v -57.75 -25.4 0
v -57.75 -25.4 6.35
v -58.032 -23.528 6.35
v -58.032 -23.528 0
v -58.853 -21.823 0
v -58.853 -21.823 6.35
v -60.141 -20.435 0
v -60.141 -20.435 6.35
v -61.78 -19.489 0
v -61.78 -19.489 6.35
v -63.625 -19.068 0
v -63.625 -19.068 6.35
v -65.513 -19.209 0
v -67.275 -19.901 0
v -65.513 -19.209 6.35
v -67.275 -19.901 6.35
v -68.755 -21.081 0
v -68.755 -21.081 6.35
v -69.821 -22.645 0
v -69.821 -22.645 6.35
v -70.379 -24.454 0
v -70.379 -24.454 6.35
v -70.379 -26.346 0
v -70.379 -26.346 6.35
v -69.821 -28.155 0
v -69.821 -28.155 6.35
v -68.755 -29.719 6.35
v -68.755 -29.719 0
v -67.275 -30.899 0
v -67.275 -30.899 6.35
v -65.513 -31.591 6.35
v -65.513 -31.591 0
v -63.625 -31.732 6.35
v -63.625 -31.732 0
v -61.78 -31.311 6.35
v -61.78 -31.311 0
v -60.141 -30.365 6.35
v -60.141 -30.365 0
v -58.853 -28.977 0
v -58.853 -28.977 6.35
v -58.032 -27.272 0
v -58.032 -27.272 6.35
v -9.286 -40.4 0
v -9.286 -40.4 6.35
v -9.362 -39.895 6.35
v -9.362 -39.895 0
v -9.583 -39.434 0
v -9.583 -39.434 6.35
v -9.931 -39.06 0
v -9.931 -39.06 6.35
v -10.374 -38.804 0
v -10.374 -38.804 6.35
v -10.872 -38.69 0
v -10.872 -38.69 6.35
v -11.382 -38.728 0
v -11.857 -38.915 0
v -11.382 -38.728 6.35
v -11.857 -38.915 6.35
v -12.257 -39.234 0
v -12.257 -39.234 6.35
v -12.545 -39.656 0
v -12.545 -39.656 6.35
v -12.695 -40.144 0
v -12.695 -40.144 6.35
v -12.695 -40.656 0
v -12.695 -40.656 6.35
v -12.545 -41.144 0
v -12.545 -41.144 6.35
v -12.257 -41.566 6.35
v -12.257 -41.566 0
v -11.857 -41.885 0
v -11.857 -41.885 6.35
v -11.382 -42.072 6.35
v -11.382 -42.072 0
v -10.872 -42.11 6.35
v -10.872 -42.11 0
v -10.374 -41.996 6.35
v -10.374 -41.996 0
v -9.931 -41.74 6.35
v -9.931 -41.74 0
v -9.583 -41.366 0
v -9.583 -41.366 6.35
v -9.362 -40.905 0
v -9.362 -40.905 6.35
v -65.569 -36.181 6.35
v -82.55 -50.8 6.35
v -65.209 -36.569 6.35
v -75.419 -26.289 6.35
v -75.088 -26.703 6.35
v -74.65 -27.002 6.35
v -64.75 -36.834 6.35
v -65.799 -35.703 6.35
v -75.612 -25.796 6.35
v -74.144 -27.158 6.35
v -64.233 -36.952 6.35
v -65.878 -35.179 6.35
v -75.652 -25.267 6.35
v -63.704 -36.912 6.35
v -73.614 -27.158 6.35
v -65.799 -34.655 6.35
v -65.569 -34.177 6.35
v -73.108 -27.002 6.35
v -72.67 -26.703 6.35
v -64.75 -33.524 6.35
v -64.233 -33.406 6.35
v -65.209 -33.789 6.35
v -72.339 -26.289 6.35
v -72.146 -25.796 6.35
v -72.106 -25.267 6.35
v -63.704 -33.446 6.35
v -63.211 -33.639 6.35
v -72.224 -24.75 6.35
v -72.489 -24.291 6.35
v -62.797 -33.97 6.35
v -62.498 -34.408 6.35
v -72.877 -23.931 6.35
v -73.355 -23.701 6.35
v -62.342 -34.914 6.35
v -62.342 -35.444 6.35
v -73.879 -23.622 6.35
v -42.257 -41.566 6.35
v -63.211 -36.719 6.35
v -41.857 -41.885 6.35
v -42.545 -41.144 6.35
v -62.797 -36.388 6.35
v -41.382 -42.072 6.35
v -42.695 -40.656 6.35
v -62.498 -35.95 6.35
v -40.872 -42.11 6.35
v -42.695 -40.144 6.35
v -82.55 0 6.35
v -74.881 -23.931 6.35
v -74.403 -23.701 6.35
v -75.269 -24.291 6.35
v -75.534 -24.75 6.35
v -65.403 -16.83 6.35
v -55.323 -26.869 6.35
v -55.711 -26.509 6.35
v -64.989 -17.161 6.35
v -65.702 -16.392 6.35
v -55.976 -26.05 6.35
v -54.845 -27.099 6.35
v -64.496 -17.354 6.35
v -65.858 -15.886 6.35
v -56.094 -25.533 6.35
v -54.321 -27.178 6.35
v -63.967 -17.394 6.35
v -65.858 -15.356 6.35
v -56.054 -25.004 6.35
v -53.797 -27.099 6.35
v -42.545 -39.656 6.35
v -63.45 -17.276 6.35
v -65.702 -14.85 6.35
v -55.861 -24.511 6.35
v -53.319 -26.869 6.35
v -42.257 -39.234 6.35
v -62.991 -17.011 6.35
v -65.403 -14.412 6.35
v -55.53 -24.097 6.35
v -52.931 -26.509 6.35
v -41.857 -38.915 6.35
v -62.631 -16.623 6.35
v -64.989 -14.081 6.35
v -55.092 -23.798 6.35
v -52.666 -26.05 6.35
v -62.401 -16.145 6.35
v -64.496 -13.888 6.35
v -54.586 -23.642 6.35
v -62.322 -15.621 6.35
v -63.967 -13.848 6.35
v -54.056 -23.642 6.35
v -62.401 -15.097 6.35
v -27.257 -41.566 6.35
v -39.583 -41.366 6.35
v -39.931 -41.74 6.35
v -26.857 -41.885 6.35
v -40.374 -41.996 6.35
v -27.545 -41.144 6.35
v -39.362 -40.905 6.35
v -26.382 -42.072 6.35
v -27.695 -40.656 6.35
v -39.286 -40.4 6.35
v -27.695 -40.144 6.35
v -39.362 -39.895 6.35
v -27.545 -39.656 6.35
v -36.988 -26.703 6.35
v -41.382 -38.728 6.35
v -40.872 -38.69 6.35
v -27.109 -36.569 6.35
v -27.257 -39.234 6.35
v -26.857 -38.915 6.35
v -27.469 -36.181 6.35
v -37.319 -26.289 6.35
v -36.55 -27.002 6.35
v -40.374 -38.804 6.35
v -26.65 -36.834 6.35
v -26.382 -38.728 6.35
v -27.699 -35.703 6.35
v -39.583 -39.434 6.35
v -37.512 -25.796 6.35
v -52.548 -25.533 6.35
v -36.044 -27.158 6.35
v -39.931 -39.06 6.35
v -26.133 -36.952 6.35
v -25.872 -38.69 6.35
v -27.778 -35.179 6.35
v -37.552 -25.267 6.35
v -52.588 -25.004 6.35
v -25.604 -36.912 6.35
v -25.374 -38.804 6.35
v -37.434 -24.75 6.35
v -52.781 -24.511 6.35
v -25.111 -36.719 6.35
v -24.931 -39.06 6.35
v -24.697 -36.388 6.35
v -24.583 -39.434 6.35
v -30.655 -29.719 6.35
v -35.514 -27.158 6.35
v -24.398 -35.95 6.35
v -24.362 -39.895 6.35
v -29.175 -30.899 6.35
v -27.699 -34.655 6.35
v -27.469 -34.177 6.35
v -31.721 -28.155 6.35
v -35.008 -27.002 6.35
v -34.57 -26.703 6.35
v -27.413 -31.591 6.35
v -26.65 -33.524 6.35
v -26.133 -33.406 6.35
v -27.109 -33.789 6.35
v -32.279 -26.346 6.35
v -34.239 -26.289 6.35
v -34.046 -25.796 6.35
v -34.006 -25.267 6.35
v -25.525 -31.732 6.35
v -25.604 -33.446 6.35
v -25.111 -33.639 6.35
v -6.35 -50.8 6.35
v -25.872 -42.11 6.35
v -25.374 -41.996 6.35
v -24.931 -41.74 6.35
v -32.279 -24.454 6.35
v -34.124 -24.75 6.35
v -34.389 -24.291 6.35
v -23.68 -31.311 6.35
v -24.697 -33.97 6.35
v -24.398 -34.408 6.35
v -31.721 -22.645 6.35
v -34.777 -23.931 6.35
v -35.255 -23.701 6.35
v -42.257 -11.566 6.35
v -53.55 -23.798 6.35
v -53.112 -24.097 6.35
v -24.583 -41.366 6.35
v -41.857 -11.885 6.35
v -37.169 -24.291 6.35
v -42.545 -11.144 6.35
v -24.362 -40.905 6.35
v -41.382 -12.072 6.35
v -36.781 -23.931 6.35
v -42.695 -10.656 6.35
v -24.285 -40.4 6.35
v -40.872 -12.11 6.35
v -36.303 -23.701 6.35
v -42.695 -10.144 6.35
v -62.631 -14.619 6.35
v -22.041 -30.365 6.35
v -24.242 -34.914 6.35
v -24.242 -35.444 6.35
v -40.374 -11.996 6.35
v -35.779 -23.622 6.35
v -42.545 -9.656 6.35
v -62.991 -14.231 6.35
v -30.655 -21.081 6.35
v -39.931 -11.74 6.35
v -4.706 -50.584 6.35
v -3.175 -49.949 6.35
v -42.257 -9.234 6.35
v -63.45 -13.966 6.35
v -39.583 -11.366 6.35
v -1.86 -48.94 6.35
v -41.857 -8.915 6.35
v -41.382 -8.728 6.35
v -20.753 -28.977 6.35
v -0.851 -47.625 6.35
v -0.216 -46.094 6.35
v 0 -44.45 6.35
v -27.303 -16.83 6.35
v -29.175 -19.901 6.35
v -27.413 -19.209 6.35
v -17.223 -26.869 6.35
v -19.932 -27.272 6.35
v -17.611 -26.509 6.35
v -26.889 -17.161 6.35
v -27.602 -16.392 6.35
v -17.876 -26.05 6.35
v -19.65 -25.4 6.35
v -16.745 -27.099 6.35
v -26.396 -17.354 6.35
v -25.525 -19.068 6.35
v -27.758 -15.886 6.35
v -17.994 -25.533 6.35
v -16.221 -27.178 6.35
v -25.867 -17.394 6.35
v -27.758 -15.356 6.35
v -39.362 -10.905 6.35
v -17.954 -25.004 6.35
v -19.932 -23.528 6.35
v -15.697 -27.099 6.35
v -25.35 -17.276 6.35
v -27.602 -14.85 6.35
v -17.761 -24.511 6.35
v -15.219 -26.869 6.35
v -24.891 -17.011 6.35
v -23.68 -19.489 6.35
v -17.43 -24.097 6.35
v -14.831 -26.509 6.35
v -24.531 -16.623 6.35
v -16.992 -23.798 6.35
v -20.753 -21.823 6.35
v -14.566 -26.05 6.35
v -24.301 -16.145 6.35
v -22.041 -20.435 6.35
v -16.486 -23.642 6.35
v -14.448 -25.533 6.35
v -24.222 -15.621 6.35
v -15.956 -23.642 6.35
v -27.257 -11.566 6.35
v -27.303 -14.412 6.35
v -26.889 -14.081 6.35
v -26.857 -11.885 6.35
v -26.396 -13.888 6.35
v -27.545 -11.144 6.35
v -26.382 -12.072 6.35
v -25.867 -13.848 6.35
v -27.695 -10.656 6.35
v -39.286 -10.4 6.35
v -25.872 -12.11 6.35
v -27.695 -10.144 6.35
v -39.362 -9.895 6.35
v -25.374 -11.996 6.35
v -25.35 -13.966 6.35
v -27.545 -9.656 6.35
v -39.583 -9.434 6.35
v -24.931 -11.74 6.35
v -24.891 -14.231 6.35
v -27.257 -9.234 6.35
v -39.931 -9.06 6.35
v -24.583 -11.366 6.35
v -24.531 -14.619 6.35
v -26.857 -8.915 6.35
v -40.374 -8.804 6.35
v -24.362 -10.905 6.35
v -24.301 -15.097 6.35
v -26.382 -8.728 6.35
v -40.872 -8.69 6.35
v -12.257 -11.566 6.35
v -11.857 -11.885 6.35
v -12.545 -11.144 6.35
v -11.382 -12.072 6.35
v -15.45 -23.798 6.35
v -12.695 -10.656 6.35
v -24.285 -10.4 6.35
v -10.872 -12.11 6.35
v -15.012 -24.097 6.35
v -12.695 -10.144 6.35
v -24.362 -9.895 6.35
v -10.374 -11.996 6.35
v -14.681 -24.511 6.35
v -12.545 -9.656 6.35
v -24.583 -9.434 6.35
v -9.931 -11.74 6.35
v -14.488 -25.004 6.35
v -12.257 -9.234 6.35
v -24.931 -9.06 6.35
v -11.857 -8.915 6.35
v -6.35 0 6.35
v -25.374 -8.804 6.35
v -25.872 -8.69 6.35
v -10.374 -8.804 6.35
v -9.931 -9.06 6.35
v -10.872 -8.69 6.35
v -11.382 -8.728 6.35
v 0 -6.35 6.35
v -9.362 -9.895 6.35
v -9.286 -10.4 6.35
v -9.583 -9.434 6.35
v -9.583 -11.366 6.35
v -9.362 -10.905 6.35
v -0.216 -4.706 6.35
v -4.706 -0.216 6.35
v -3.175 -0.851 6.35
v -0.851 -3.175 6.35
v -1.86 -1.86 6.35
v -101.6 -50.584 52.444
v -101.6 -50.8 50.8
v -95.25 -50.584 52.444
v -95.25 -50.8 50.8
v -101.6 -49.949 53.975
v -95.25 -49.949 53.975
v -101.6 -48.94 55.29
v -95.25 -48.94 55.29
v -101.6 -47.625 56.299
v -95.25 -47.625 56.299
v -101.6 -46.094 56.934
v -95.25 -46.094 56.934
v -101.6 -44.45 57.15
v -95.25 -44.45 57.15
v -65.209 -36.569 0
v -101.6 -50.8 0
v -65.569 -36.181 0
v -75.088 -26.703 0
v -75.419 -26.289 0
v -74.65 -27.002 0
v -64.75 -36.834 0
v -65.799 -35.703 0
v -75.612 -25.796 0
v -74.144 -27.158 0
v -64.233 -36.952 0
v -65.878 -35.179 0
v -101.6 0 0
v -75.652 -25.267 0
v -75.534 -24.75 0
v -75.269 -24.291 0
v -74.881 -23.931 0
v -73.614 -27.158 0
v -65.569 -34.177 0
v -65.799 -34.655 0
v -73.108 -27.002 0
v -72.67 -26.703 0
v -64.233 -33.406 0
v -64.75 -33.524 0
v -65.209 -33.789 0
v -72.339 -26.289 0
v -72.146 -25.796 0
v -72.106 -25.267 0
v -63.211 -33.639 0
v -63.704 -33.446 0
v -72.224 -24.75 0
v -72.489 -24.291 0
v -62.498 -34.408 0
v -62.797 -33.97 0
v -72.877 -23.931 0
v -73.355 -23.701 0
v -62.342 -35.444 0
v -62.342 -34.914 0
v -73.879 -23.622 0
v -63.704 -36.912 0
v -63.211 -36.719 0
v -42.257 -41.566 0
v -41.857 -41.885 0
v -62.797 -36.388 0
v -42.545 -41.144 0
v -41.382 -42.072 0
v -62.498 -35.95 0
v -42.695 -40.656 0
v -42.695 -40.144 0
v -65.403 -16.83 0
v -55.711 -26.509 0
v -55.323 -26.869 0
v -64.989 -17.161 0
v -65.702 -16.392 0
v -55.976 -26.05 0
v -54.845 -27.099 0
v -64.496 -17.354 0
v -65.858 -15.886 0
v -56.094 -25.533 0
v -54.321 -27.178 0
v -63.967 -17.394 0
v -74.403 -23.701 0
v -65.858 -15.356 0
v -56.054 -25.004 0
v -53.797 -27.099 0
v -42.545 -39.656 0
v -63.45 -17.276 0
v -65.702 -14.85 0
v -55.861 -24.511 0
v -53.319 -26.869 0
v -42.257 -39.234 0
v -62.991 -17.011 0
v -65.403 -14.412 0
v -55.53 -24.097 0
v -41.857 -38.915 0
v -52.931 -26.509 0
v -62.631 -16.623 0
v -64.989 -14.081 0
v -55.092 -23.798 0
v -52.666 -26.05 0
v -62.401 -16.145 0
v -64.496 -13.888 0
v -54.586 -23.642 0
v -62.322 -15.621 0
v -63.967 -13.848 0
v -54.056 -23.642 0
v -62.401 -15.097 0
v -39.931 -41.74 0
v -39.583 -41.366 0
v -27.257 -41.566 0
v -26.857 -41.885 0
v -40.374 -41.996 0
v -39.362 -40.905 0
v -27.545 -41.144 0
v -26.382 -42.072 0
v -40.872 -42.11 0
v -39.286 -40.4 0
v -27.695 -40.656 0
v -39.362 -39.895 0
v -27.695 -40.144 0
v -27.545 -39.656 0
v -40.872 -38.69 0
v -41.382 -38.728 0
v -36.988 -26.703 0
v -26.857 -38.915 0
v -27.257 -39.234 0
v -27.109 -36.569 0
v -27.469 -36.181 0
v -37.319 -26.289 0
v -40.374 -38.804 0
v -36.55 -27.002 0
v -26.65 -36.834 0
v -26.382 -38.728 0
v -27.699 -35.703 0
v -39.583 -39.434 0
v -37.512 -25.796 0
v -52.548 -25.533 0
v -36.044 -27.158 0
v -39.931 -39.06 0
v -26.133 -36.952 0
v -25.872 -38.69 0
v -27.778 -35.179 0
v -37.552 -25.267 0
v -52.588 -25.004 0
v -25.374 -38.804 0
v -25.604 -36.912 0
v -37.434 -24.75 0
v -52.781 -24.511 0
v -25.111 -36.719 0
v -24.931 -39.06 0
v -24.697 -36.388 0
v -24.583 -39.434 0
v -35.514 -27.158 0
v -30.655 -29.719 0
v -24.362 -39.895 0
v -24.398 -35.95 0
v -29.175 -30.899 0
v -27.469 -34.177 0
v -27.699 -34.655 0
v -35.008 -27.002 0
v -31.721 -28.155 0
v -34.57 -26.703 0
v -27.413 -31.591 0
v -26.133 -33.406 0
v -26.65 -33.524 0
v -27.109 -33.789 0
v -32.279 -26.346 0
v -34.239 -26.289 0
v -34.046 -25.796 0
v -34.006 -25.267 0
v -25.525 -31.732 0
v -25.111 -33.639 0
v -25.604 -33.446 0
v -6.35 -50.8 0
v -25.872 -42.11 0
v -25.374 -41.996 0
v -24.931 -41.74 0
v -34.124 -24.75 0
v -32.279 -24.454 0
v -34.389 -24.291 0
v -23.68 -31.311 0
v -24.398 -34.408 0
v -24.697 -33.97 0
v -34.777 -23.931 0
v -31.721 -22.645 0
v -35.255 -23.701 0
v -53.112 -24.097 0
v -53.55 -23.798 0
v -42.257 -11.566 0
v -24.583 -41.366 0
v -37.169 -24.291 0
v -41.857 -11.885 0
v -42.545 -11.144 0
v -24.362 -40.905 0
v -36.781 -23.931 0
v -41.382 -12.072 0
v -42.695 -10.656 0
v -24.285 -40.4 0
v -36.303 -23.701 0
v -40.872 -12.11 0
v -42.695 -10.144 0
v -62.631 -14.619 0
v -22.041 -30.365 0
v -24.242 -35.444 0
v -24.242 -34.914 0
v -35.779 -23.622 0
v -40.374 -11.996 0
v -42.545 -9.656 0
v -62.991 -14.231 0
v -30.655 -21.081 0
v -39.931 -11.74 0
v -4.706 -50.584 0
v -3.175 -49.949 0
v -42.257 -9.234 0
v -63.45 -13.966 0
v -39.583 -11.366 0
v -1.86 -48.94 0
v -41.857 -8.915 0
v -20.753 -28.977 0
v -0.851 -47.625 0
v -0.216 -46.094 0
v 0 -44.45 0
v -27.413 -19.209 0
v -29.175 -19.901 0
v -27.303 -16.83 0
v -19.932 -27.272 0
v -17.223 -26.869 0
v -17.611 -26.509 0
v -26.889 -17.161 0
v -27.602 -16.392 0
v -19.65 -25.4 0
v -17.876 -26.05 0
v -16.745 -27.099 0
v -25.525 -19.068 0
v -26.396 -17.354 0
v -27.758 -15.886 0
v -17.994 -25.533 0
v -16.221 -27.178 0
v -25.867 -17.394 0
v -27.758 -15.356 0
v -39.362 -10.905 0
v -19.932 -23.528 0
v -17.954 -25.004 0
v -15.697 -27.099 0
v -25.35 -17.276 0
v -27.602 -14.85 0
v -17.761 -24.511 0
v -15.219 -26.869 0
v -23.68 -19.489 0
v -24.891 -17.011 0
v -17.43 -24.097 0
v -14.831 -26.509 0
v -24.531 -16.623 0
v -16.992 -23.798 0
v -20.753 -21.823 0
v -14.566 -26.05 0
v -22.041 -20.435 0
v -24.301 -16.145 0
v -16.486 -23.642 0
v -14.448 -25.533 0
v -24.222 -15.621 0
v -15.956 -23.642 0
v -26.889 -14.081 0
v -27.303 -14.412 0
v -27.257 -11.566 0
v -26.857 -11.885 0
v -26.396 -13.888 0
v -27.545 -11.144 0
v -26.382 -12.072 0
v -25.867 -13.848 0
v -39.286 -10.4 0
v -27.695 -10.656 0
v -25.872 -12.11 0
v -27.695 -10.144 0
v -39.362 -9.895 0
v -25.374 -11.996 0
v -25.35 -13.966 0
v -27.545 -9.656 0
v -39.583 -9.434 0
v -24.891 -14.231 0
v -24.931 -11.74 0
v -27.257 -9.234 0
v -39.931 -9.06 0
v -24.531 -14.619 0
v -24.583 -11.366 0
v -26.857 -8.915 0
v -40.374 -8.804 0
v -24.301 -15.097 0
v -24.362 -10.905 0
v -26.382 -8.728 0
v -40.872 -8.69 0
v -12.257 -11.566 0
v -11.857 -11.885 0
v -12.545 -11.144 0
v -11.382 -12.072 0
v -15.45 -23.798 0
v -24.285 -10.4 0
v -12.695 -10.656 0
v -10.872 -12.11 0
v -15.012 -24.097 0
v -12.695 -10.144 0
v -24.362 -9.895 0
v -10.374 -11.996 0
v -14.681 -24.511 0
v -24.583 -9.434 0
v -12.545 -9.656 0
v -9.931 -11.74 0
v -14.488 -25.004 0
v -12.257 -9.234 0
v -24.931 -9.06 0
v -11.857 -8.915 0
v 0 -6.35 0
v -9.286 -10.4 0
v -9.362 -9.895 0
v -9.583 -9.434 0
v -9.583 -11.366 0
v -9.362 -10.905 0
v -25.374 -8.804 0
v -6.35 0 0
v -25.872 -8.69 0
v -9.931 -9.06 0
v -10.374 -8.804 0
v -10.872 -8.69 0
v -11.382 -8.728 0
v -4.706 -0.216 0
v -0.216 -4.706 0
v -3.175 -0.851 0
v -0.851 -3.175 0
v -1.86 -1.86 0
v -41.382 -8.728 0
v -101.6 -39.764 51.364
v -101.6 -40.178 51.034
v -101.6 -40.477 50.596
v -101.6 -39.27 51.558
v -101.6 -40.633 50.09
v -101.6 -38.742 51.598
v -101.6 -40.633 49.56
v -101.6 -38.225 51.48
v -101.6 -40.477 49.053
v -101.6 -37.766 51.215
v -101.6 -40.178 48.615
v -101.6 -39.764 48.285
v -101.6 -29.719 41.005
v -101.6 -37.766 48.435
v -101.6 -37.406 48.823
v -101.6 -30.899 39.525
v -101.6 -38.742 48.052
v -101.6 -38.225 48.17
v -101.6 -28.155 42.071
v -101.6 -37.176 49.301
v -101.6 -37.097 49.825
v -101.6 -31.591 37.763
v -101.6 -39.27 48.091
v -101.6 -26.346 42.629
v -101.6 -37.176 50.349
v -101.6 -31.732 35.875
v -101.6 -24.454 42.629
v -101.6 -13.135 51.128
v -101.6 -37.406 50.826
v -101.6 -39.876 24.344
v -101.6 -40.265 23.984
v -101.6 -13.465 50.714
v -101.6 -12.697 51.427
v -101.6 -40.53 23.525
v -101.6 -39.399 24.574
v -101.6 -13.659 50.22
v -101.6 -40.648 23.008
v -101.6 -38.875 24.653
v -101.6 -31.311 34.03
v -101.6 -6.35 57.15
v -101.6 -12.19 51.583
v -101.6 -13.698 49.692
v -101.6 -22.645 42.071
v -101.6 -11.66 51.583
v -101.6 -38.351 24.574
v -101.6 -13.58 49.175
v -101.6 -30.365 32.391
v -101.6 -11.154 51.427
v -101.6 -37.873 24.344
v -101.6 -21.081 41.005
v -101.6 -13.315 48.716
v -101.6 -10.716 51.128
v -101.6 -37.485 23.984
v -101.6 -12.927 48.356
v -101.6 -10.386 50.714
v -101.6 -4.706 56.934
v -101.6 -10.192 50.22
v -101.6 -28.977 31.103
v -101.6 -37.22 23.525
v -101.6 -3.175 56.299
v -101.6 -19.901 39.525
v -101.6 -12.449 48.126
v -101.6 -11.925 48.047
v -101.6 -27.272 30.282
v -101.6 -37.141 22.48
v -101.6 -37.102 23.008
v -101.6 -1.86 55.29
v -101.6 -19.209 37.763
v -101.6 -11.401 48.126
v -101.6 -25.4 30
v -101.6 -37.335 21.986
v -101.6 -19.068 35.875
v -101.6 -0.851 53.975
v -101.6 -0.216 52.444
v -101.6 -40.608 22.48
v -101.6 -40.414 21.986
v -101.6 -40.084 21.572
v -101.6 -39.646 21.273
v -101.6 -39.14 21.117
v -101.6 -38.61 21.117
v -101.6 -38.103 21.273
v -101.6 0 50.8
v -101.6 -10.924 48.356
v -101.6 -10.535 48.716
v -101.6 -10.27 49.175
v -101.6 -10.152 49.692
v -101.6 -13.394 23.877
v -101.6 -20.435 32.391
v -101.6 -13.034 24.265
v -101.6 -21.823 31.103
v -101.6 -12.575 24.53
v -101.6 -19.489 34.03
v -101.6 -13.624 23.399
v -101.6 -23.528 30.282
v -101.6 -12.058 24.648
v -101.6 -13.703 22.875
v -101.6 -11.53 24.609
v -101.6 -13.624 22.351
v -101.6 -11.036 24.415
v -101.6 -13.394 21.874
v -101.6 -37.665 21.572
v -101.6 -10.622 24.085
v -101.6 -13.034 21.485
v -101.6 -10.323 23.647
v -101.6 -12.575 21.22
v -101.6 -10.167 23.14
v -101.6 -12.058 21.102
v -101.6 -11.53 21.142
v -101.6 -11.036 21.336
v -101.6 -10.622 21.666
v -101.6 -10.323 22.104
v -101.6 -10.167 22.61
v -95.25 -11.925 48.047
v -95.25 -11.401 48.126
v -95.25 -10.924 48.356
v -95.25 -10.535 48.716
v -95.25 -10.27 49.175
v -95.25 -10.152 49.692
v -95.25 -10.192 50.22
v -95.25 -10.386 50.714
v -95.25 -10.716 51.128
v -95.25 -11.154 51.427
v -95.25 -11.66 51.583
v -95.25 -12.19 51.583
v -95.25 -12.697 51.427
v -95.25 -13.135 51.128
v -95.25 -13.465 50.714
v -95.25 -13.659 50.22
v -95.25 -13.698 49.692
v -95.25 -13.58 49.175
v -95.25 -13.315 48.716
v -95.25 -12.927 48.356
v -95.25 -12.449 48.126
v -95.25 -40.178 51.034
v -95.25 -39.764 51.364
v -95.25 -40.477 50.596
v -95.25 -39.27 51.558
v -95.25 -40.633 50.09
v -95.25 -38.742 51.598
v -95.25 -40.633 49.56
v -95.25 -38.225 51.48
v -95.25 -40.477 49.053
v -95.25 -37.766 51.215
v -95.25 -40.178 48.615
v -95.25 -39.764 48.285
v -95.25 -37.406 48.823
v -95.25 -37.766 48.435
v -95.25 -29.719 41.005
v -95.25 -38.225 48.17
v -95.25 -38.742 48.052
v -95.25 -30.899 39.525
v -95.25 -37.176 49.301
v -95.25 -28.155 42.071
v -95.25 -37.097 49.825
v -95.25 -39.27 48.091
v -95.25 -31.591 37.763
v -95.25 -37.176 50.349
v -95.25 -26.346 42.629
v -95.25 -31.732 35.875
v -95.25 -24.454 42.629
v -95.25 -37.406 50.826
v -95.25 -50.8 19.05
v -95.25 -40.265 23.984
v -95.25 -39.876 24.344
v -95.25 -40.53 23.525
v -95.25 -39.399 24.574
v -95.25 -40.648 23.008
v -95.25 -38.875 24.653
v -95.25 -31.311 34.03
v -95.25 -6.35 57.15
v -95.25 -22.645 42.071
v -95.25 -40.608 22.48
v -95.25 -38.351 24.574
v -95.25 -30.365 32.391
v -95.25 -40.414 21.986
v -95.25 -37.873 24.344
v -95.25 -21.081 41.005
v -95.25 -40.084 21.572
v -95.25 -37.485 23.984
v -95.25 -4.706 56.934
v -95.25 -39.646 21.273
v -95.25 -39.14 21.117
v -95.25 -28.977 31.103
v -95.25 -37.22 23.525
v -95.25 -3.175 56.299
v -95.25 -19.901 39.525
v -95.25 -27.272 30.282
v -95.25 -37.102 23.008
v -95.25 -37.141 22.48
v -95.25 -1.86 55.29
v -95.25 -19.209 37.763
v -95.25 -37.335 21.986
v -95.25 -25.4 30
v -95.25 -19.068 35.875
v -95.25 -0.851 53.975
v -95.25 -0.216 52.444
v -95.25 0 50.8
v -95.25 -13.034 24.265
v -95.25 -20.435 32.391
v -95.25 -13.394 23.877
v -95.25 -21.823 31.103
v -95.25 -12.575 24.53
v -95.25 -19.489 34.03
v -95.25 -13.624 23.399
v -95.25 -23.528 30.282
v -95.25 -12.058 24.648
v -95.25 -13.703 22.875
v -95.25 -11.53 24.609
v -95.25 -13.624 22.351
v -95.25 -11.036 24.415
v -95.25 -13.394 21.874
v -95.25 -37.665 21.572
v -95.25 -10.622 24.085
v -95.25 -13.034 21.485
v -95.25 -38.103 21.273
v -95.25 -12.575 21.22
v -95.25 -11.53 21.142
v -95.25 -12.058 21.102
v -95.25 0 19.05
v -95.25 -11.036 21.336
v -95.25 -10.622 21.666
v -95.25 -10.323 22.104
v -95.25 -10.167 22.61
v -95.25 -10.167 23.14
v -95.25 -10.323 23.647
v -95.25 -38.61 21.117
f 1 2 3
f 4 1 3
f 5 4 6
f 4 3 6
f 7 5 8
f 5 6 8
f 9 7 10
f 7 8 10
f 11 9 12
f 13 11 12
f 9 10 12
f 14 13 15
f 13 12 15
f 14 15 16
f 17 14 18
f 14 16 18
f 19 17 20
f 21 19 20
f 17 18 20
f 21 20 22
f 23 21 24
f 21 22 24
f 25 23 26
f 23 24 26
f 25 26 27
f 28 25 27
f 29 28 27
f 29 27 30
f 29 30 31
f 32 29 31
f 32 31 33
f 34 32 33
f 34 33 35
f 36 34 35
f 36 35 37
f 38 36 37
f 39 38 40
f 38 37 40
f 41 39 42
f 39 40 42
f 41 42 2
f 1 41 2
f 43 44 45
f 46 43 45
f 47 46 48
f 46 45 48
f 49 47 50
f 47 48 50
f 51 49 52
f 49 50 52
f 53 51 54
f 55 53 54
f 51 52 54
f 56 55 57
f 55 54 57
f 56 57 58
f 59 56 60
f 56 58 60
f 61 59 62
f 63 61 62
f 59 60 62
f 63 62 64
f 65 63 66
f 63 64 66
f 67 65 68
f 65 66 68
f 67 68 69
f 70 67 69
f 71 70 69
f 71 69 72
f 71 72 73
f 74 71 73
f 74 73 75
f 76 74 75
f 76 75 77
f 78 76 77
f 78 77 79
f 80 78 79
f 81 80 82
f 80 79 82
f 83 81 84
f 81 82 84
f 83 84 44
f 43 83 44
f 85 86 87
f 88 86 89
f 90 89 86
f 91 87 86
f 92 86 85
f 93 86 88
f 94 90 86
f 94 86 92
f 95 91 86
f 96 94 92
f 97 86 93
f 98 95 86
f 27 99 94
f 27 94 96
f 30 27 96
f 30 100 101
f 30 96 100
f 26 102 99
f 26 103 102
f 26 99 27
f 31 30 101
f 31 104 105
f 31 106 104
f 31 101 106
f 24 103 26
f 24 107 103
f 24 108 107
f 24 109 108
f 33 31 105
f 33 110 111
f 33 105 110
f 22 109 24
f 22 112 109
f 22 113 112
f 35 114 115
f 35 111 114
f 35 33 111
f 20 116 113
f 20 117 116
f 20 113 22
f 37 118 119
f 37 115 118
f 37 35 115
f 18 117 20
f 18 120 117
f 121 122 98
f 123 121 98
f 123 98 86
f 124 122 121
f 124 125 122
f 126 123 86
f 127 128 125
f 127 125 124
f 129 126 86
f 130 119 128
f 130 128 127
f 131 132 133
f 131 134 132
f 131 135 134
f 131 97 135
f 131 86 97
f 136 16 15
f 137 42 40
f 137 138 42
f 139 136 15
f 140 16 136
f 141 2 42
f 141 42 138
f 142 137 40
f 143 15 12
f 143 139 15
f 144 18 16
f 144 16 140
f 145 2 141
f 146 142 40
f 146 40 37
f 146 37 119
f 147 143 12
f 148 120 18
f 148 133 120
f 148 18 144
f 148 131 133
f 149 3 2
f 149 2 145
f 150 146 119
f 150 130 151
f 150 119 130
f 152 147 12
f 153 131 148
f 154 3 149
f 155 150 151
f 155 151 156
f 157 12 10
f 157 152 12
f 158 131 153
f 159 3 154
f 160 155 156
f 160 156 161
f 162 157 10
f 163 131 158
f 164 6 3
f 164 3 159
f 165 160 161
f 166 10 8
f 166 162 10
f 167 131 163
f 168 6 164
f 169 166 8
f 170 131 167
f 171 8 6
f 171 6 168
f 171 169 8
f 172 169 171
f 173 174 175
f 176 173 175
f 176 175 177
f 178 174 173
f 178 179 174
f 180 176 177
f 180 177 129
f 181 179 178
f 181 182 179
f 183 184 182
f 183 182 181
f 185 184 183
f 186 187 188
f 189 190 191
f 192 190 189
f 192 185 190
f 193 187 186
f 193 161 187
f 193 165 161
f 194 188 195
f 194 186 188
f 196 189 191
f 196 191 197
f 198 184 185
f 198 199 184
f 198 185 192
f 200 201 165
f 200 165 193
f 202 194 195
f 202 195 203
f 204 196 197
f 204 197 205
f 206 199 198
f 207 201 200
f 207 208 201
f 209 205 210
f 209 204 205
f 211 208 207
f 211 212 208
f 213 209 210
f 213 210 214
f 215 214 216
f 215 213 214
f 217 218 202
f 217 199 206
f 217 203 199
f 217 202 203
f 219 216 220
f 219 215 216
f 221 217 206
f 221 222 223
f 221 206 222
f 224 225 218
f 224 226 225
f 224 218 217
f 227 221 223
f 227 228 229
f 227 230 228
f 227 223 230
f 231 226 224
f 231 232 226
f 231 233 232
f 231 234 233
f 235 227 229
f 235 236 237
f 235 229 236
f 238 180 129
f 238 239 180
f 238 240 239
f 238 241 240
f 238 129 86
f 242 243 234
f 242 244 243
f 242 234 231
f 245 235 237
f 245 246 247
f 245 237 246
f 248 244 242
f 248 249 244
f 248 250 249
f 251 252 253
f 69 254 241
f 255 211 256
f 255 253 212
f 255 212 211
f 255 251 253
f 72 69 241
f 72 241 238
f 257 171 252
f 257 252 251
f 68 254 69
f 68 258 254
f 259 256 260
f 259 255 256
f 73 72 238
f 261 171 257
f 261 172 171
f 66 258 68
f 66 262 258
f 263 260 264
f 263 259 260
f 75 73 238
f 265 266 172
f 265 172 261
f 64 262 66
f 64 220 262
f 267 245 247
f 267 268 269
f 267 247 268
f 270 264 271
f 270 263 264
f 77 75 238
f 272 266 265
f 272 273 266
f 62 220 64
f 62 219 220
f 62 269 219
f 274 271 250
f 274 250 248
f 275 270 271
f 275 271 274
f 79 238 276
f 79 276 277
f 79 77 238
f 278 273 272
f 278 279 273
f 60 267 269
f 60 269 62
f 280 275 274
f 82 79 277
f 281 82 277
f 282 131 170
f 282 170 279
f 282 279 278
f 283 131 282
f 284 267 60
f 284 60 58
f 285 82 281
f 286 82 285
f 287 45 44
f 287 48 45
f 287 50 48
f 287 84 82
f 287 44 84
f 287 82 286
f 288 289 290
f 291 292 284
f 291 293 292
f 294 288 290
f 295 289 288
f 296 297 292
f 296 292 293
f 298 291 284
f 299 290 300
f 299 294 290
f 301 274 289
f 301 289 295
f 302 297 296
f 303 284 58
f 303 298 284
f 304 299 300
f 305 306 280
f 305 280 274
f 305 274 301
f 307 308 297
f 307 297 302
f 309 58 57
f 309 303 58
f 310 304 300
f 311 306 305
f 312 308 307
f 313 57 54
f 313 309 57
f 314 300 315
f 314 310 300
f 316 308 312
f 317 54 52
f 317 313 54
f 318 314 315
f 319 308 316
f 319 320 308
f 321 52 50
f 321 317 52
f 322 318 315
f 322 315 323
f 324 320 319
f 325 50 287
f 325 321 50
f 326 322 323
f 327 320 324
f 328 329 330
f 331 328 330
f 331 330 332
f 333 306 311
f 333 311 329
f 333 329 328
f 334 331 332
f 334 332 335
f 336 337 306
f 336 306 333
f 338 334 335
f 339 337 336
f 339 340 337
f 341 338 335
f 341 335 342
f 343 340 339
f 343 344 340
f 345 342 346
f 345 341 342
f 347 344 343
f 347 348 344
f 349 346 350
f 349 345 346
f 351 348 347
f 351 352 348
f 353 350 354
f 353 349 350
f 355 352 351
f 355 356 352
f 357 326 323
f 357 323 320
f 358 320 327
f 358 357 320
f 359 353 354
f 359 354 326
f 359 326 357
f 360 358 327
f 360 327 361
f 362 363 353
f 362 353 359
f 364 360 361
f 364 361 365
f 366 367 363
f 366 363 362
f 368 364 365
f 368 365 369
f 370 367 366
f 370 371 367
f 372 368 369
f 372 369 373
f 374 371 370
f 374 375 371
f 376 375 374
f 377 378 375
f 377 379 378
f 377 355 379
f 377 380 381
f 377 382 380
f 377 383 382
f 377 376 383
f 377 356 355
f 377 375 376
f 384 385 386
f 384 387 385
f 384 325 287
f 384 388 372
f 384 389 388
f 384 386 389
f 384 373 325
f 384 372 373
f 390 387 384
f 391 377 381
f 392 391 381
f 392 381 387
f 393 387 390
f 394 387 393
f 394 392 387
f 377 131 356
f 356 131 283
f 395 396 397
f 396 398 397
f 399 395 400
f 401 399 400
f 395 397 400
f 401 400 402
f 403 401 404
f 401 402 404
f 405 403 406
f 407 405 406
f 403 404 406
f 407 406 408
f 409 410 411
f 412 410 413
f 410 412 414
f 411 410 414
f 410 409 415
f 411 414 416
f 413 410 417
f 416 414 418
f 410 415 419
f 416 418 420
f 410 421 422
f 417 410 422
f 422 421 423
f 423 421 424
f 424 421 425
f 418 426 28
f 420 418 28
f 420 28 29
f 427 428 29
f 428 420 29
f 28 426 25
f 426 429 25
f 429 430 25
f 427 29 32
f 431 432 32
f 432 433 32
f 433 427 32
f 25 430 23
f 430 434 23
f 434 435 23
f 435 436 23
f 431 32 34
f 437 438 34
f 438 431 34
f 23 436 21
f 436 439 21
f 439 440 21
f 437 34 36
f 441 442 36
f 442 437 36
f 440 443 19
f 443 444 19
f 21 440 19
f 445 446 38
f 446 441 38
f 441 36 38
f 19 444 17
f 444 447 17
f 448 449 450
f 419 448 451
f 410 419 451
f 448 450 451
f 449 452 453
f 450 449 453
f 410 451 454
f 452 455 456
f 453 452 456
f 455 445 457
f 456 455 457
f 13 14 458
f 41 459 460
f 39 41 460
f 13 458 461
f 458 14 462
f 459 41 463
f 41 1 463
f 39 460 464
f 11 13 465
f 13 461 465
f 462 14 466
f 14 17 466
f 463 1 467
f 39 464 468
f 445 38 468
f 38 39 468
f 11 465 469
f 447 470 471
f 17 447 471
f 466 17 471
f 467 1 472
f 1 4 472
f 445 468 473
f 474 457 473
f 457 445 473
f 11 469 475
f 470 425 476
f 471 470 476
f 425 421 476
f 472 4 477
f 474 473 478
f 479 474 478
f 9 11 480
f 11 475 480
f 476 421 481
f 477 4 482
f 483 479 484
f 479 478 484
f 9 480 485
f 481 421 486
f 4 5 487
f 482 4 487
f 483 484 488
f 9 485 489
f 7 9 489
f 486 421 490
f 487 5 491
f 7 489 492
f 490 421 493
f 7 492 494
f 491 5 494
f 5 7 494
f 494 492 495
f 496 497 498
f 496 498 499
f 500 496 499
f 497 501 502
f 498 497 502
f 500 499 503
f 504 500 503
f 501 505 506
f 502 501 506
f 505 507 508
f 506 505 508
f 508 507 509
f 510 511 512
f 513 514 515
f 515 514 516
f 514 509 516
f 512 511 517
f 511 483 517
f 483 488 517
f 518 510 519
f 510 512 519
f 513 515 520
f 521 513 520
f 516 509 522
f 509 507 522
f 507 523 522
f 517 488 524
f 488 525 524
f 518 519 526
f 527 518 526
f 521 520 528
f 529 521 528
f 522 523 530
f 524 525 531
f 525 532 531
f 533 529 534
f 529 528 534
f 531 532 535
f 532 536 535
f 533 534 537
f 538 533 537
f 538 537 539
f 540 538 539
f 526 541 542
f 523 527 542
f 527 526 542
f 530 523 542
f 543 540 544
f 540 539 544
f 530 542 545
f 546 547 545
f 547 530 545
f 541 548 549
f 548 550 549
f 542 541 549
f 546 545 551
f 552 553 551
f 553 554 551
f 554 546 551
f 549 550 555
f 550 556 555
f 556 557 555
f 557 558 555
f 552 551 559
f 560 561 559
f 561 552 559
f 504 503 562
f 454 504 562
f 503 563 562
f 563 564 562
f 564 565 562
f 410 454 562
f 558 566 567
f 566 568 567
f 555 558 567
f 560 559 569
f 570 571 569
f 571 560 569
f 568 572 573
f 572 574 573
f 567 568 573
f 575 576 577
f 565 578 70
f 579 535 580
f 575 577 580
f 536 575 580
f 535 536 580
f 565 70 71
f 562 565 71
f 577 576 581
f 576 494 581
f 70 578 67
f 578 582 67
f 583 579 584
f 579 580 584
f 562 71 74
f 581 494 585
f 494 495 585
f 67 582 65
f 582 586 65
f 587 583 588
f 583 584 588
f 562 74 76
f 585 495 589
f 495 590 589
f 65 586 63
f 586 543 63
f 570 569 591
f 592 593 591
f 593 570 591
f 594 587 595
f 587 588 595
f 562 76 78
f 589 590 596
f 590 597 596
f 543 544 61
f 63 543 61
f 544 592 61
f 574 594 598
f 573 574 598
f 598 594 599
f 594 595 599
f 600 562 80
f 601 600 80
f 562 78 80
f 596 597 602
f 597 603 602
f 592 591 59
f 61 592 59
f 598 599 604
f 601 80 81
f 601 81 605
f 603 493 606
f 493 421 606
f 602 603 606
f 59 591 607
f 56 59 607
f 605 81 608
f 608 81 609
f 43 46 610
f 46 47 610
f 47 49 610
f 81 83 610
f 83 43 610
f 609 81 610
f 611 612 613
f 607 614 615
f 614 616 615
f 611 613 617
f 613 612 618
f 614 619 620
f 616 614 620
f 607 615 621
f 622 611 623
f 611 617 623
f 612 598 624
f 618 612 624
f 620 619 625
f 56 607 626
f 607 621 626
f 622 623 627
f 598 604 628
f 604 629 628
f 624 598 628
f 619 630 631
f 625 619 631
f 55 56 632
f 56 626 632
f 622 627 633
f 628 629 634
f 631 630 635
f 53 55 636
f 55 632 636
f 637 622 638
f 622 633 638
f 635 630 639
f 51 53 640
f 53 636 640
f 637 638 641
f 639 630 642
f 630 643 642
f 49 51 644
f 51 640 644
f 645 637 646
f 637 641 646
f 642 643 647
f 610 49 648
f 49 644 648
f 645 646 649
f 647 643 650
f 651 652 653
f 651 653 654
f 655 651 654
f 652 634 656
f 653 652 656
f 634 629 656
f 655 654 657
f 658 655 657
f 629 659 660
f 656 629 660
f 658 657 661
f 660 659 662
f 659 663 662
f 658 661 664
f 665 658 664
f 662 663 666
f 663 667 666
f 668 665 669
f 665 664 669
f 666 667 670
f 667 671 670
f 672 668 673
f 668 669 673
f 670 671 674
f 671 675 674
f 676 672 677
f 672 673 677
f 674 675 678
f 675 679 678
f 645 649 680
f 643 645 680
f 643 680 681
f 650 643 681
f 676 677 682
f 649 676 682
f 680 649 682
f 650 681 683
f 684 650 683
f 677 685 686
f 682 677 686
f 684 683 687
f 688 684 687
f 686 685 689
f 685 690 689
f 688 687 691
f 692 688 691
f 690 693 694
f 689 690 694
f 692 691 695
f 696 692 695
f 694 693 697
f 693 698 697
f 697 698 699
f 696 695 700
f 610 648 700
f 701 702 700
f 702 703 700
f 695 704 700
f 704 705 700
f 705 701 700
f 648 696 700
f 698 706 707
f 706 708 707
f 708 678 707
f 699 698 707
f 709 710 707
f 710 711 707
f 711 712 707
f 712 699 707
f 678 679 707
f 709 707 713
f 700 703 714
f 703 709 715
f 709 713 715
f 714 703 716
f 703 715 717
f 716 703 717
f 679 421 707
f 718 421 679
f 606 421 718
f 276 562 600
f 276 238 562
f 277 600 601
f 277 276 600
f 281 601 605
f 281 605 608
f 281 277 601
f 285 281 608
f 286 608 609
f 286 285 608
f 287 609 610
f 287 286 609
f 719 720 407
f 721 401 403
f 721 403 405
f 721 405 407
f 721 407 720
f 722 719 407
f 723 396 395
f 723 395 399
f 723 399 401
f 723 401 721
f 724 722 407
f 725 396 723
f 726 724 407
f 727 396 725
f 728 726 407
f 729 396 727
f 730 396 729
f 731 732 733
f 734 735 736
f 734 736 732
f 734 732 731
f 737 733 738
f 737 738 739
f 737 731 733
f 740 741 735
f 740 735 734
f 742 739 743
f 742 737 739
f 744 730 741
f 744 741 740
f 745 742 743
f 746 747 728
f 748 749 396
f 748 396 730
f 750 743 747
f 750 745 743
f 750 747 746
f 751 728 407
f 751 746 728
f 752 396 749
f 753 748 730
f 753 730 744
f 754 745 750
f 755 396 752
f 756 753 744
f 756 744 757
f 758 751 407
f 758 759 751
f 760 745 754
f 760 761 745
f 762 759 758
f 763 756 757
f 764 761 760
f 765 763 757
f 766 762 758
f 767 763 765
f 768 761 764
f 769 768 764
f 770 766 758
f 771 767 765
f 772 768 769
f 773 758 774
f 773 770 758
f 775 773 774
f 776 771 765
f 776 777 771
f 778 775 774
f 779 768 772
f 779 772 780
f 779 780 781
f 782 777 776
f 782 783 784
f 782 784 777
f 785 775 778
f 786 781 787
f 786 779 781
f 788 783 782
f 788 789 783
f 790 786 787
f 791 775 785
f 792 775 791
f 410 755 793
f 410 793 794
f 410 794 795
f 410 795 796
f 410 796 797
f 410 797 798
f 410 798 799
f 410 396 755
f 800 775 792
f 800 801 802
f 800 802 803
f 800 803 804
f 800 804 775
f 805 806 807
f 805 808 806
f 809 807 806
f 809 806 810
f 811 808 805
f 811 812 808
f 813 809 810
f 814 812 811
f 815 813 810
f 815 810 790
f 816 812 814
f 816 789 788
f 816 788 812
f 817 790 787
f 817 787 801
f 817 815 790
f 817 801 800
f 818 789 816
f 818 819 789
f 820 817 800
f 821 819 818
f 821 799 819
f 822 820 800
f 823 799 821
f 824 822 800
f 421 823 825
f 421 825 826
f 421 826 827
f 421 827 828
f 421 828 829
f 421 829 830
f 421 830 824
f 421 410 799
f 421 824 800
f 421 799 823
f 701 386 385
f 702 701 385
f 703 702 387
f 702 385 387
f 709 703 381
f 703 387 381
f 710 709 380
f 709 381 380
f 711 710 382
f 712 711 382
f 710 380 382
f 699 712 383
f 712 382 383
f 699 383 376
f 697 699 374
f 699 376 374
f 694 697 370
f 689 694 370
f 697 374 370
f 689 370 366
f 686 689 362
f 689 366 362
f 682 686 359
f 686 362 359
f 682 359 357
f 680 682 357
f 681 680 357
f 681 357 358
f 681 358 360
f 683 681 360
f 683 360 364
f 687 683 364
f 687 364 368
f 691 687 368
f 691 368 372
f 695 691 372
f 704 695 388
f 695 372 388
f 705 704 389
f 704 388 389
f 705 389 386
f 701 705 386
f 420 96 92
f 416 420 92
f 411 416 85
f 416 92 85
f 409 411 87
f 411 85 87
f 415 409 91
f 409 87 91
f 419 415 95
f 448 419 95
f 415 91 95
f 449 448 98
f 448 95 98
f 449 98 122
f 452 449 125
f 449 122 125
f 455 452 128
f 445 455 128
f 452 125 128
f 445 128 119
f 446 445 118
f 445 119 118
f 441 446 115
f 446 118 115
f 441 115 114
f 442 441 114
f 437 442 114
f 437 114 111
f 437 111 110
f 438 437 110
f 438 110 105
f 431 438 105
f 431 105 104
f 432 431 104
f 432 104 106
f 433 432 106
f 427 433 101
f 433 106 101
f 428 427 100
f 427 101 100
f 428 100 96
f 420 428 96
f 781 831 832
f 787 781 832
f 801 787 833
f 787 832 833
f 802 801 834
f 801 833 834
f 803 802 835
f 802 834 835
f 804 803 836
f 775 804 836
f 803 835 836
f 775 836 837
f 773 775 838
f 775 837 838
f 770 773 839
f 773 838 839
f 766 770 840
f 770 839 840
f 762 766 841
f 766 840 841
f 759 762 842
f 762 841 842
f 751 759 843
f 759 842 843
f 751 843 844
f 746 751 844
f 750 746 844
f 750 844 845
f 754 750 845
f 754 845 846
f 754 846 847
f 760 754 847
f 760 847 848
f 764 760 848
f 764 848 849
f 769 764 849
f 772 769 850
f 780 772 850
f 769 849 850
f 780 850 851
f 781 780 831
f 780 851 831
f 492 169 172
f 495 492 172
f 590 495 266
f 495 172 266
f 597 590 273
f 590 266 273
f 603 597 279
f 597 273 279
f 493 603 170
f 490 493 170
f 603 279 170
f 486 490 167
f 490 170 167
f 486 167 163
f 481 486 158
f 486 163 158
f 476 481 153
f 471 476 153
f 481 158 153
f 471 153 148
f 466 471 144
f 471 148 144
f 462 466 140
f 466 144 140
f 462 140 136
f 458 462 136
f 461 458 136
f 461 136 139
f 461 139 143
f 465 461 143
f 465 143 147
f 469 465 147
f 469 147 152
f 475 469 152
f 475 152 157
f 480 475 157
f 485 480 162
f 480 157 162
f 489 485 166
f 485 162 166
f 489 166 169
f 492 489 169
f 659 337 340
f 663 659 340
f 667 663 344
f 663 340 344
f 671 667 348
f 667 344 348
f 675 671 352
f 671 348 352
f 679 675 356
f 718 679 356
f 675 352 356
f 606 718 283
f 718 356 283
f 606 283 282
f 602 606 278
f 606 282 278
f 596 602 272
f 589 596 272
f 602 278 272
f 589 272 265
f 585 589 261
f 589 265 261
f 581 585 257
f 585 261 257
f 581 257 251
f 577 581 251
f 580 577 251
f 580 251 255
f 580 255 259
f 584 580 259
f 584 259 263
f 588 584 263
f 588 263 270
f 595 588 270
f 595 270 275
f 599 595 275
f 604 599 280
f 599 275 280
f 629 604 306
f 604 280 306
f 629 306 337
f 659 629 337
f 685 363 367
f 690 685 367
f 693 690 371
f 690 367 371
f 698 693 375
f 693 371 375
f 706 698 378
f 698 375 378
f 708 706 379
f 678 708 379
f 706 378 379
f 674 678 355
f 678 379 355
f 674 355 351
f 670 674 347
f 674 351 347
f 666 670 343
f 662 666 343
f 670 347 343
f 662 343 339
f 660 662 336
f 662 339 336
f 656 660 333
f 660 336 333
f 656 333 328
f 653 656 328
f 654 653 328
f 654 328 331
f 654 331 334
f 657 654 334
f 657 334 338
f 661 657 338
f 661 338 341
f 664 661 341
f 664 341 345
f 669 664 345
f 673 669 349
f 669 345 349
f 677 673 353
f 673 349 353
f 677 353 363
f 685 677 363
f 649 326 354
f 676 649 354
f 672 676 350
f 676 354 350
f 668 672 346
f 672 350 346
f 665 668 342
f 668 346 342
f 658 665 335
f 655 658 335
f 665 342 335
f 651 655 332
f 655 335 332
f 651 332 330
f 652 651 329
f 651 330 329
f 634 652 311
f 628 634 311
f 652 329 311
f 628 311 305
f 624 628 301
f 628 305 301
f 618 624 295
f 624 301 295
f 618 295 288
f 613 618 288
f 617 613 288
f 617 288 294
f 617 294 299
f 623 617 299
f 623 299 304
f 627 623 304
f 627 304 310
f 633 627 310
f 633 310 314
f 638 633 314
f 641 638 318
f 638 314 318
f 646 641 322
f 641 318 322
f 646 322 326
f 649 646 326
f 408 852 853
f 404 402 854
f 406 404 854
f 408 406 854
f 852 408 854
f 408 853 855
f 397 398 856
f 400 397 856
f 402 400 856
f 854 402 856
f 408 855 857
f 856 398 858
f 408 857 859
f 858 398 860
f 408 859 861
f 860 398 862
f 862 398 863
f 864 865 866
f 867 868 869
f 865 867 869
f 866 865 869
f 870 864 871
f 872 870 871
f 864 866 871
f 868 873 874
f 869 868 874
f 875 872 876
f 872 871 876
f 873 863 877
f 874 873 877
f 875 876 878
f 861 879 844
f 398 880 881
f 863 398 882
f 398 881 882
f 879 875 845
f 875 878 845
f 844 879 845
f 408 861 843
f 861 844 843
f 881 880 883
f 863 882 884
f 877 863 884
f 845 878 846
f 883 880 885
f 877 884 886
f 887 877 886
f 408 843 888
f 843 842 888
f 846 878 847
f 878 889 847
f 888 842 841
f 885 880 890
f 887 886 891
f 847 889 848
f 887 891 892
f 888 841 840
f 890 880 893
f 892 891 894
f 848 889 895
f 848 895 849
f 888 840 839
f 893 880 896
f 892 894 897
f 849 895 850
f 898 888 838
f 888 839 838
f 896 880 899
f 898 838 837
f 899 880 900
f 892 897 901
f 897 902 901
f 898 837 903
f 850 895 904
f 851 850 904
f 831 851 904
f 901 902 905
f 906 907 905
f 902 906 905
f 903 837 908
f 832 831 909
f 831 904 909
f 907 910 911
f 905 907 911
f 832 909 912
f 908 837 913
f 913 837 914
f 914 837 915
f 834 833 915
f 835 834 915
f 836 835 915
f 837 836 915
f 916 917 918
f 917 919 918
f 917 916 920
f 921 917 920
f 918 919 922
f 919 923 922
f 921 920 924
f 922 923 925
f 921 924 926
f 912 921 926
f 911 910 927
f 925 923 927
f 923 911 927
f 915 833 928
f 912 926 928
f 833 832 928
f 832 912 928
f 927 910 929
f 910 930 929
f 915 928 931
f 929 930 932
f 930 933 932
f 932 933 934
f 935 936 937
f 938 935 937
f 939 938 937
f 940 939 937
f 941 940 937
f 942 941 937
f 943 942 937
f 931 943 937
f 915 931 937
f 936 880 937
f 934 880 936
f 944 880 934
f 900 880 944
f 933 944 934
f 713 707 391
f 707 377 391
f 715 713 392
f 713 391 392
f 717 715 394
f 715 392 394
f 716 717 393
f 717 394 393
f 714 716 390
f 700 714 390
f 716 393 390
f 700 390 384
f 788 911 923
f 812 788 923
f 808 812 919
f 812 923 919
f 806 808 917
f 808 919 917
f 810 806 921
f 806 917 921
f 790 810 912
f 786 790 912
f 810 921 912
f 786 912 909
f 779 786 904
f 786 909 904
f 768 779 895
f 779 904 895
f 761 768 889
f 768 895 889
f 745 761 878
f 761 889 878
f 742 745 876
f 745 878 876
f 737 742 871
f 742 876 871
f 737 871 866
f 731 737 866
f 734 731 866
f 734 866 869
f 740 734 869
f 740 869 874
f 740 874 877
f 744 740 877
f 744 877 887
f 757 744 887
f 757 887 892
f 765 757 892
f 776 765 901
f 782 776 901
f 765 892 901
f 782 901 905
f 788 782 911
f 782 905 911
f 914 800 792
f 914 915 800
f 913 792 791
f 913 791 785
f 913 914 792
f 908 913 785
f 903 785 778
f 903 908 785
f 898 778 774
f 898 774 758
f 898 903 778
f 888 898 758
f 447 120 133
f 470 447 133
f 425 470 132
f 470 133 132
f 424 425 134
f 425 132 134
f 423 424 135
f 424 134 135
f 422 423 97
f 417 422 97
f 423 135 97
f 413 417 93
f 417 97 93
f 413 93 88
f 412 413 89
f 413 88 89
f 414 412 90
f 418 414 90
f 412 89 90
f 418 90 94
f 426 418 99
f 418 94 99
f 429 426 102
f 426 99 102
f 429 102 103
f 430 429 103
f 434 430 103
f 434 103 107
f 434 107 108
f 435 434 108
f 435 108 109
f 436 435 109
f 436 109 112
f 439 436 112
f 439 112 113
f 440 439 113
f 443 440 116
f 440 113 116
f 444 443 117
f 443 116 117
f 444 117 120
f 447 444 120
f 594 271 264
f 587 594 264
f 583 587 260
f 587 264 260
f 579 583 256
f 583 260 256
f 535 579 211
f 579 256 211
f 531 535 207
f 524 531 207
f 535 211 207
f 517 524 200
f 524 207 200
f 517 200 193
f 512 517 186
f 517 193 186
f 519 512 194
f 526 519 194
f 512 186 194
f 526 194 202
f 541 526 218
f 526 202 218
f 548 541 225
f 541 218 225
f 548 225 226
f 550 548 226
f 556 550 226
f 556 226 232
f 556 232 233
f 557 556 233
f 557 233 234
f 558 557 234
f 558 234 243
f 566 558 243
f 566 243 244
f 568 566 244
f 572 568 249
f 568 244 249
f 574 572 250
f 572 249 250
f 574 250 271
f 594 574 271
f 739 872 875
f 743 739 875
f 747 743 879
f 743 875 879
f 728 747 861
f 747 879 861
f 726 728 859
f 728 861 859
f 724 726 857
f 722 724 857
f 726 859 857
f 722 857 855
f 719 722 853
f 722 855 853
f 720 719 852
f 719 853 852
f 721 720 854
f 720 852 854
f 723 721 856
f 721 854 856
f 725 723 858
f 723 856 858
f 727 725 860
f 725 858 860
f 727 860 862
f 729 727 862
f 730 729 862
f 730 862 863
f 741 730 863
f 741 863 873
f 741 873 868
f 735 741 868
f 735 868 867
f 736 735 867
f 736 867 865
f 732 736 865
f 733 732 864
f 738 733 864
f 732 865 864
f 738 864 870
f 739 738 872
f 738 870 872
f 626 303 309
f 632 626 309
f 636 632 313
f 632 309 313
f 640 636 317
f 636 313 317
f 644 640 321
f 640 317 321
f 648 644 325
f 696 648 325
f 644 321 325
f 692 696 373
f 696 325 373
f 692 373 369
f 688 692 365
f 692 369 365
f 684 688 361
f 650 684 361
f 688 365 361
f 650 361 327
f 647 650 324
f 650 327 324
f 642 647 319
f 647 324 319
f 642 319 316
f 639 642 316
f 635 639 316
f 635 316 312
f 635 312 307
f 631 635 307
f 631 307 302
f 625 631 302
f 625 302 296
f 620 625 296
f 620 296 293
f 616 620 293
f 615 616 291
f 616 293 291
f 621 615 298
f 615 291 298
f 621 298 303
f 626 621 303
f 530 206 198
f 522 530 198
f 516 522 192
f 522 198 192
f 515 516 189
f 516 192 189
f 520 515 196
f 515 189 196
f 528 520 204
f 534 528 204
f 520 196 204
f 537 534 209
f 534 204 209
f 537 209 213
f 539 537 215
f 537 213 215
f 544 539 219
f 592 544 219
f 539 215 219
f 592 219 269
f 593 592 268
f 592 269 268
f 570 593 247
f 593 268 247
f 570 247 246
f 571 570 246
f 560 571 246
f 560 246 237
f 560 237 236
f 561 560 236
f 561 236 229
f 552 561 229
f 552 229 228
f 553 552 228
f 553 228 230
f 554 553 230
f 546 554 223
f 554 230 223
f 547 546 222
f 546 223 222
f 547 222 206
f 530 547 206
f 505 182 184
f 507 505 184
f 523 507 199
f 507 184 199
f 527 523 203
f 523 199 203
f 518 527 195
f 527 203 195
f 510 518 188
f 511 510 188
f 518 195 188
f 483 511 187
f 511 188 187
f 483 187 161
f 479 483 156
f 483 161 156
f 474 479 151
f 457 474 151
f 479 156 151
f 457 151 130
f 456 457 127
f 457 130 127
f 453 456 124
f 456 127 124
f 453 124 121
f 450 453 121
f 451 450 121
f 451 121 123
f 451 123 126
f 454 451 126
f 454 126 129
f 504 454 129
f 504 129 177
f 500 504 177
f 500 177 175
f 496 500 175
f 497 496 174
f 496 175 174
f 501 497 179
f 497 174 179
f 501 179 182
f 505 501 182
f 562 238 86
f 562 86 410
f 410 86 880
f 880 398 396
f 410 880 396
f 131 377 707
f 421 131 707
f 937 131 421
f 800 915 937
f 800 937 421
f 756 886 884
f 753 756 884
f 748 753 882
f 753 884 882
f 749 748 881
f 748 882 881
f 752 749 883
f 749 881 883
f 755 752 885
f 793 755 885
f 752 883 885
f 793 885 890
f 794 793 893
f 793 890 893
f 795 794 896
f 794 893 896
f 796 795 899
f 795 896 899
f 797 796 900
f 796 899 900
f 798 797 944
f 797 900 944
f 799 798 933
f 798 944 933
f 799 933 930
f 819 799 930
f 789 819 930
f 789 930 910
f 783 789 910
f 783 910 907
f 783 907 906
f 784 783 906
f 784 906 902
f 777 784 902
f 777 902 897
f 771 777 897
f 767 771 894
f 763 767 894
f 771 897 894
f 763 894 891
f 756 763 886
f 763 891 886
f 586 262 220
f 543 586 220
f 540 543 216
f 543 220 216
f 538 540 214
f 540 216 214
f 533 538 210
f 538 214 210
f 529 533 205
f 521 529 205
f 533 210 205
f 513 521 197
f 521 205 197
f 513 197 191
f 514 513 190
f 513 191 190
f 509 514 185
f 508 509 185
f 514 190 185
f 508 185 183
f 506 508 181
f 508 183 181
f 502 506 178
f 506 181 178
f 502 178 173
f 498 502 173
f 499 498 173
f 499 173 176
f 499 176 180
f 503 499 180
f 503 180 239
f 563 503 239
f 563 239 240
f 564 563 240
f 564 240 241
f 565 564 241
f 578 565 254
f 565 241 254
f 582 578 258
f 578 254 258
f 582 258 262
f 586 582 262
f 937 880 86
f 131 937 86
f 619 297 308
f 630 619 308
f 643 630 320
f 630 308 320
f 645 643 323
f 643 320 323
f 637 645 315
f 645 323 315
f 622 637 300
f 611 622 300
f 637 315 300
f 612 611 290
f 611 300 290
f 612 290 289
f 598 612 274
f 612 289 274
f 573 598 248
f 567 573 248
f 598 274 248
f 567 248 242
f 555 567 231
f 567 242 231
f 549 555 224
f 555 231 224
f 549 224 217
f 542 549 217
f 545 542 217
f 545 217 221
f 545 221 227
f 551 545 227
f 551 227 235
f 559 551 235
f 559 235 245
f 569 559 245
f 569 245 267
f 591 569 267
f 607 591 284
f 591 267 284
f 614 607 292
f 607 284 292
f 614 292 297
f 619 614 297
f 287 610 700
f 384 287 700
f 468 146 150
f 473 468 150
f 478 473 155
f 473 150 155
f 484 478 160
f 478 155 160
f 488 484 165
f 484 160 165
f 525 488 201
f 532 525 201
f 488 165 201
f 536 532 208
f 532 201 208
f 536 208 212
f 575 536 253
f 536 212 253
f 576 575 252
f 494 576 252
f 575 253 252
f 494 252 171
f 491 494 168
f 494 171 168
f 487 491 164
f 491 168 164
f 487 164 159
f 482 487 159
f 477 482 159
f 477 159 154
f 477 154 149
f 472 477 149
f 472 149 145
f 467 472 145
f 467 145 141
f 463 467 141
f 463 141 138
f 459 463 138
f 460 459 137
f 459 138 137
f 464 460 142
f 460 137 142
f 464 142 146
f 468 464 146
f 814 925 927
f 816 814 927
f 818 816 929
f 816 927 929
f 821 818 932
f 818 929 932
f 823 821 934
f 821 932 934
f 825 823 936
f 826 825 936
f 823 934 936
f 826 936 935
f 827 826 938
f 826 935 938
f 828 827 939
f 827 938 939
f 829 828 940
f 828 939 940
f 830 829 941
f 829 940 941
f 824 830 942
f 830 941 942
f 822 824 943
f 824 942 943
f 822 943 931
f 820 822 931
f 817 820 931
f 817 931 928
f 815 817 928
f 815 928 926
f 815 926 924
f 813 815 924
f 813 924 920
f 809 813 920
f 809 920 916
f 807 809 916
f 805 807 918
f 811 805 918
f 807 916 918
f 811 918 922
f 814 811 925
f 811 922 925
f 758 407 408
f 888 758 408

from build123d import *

# Parameters (mm, degrees)
SKETCH1_W                 = 101.6
SKETCH1_H                 = 50.8
BOSS_EXTRUDE1_DEPTH       = 6.35
SKETCH2_R                 = 1.7145
CUT_EXTRUDE1_DEPTH        = 6.35
SKETCH3_R                 = 1.778
CUT_EXTRUDE2_DEPTH        = 6.35
SKETCH4_R                 = 6.35
CUT_EXTRUDE3_DEPTH        = 6.35
CIRPATTERN1_COUNT         = 4
SKETCH5_W                 = 6.35
SKETCH5_H                 = 50.8
BOSS_EXTRUDE2_DEPTH       = 50.8
SKETCH6_R                 = 6.35
CUT_EXTRUDE4_DEPTH        = 6.35
SKETCH7_R                 = 1.778
CUT_EXTRUDE5_DEPTH        = 6.35
CIRPATTERN2_COUNT         = 4
LPATTERN1_COUNT           = 2
LPATTERN1_PITCH           = 38.1
LPATTERN1_COPY_1_SKETCH_R = 1.778
LPATTERN1_COPY_1_DEPTH    = 6.35
LPATTERN1_COPY_2_SKETCH_R = 1.778
LPATTERN1_COPY_2_DEPTH    = 6.35
LPATTERN1_COPY_3_SKETCH_R = 1.778
LPATTERN1_COPY_3_DEPTH    = 6.35
BOSS_EXTRUDE3_DEPTH       = 50.8
FILLET1_R                 = 6.35


with BuildPart() as part:
    # Sketch1 → Boss-Extrude1 (new body)
    with BuildSketch(Plane.XY):
        with Locations((-50.8, -25.4)):
            Rectangle(SKETCH1_W, SKETCH1_H)
    extrude(amount=BOSS_EXTRUDE1_DEPTH)

    # Sketch2 → Cut-Extrude1 (cut)
    with BuildSketch(Plane.XY.offset(6.35)):
        with Locations((-11, -10.400000028)):
            Circle(SKETCH2_R)
        with Locations((-41, -10.400000028)):
            Circle(SKETCH2_R)
        with Locations((-41, -40.399999972)):
            Circle(SKETCH2_R)
        with Locations((-11, -40.399999972)):
            Circle(SKETCH2_R)
        with Locations((-25.999999972, -40.399999972)):
            Circle(SKETCH2_R)
        with Locations((-25.999999972, -10.400000028)):
            Circle(SKETCH2_R)
    extrude(amount=-CUT_EXTRUDE1_DEPTH, mode=Mode.SUBTRACT)

    # Sketch3 → Cut-Extrude2 (cut)
    with BuildSketch(Plane.XY.offset(6.35)):
        with Locations((-26, -15.621)):
            Circle(SKETCH3_R)
    cut_extrude2 = extrude(amount=-CUT_EXTRUDE2_DEPTH, mode=Mode.SUBTRACT)

    # Sketch4 → Cut-Extrude3 (cut)
    with BuildSketch(Plane.XY.offset(6.35)):
        with Locations((-26, -25.4)):
            Circle(SKETCH4_R)
    cut_extrude3 = extrude(amount=-CUT_EXTRUDE3_DEPTH, mode=Mode.SUBTRACT)

    # CirPattern1: Cut-Extrude2 ×4 about axis
    cirpattern1_axis = Axis((-26, -25.4, 0), (0, 0, 1))
    for i in range(1, CIRPATTERN1_COUNT):
        add(cut_extrude2.rotate(cirpattern1_axis, i * 360 / CIRPATTERN1_COUNT), mode=Mode.SUBTRACT)

    # Sketch5 → Boss-Extrude2 (add)
    with BuildSketch(Plane.XY.offset(6.35)):
        with Locations((-98.425, -25.4)):
            Rectangle(SKETCH5_W, SKETCH5_H)
    extrude(amount=BOSS_EXTRUDE2_DEPTH)

    # Sketch6 → Cut-Extrude4 (cut)
    with BuildSketch(Plane(origin=(-95.25, 0, 0), x_dir=(0, 0, -1), z_dir=(1, 0, 0))):
        with Locations((-36.35, -25.4)):
            Circle(SKETCH6_R)
    extrude(amount=-CUT_EXTRUDE4_DEPTH, mode=Mode.SUBTRACT)

    # Sketch7 → Cut-Extrude5 (cut)
    with BuildSketch(Plane(origin=(-95.25, 0, 0), x_dir=(0, 0, -1), z_dir=(1, 0, 0))):
        with Locations((-49.8247, -11.9253)):
            Circle(SKETCH7_R)
    cut_extrude5 = extrude(amount=-CUT_EXTRUDE5_DEPTH, mode=Mode.SUBTRACT)

    # CirPattern2: Cut-Extrude5 ×4 about axis
    cirpattern2_axis = Axis((0, -25.4, 36.35), (1, 0, 0))
    for i in range(1, CIRPATTERN2_COUNT):
        add(cut_extrude5.rotate(cirpattern2_axis, i * 360 / CIRPATTERN2_COUNT), mode=Mode.SUBTRACT)

    # LPattern1: Cut-Extrude3, Cut-Extrude2 ×2
    with Locations(*[(-i * LPATTERN1_PITCH, 0, 0) for i in range(1, LPATTERN1_COUNT)]):
        add(cut_extrude3, mode=Mode.SUBTRACT)
        add(cut_extrude2, mode=Mode.SUBTRACT)

    # LPattern1 copy 1 sketch → LPattern1 copy 1 (cut)
    with BuildSketch(Plane(origin=(-89.5, 0.6, 6.35), x_dir=(0, 1, 0), z_dir=(0, 0, 1))):
        with Locations((-26, -15.621)):
            Circle(LPATTERN1_COPY_1_SKETCH_R)
    extrude(amount=-LPATTERN1_COPY_1_DEPTH, mode=Mode.SUBTRACT)

    # LPattern1 copy 2 sketch → LPattern1 copy 2 (cut)
    with BuildSketch(Plane(origin=(-90.1, -50.8, 6.35), x_dir=(-1, 0, 0), z_dir=(0, 0, 1))):
        with Locations((-26, -15.621)):
            Circle(LPATTERN1_COPY_2_SKETCH_R)
    extrude(amount=-LPATTERN1_COPY_2_DEPTH, mode=Mode.SUBTRACT)

    # LPattern1 copy 3 sketch → LPattern1 copy 3 (cut)
    with BuildSketch(Plane(origin=(-38.7, -51.4, 6.35), x_dir=(0, -1, 0), z_dir=(0, 0, 1))):
        with Locations((-26, -15.621)):
            Circle(LPATTERN1_COPY_3_SKETCH_R)
    extrude(amount=-LPATTERN1_COPY_3_DEPTH, mode=Mode.SUBTRACT)

    # Sketch8 → Boss-Extrude3 (add)
    with BuildSketch(Plane.XZ.offset(50.8)):
        Polygon((-95.25, 6.35), (-95.25, 19.05), (-82.55, 6.35), align=None)
    extrude(amount=-BOSS_EXTRUDE3_DEPTH)

    # Fillet1
    fillet1_edges = [part.edges().sort_by_distance(p)[0] for p in [
        (-98.425, -50.8, 57.15),
        (-98.425, 0, 57.15),
        (0, -50.8, 3.175),
        (0, 0, 3.175),
    ]]
    fillet(fillet1_edges, radius=FILLET1_R)


solid = part.part
